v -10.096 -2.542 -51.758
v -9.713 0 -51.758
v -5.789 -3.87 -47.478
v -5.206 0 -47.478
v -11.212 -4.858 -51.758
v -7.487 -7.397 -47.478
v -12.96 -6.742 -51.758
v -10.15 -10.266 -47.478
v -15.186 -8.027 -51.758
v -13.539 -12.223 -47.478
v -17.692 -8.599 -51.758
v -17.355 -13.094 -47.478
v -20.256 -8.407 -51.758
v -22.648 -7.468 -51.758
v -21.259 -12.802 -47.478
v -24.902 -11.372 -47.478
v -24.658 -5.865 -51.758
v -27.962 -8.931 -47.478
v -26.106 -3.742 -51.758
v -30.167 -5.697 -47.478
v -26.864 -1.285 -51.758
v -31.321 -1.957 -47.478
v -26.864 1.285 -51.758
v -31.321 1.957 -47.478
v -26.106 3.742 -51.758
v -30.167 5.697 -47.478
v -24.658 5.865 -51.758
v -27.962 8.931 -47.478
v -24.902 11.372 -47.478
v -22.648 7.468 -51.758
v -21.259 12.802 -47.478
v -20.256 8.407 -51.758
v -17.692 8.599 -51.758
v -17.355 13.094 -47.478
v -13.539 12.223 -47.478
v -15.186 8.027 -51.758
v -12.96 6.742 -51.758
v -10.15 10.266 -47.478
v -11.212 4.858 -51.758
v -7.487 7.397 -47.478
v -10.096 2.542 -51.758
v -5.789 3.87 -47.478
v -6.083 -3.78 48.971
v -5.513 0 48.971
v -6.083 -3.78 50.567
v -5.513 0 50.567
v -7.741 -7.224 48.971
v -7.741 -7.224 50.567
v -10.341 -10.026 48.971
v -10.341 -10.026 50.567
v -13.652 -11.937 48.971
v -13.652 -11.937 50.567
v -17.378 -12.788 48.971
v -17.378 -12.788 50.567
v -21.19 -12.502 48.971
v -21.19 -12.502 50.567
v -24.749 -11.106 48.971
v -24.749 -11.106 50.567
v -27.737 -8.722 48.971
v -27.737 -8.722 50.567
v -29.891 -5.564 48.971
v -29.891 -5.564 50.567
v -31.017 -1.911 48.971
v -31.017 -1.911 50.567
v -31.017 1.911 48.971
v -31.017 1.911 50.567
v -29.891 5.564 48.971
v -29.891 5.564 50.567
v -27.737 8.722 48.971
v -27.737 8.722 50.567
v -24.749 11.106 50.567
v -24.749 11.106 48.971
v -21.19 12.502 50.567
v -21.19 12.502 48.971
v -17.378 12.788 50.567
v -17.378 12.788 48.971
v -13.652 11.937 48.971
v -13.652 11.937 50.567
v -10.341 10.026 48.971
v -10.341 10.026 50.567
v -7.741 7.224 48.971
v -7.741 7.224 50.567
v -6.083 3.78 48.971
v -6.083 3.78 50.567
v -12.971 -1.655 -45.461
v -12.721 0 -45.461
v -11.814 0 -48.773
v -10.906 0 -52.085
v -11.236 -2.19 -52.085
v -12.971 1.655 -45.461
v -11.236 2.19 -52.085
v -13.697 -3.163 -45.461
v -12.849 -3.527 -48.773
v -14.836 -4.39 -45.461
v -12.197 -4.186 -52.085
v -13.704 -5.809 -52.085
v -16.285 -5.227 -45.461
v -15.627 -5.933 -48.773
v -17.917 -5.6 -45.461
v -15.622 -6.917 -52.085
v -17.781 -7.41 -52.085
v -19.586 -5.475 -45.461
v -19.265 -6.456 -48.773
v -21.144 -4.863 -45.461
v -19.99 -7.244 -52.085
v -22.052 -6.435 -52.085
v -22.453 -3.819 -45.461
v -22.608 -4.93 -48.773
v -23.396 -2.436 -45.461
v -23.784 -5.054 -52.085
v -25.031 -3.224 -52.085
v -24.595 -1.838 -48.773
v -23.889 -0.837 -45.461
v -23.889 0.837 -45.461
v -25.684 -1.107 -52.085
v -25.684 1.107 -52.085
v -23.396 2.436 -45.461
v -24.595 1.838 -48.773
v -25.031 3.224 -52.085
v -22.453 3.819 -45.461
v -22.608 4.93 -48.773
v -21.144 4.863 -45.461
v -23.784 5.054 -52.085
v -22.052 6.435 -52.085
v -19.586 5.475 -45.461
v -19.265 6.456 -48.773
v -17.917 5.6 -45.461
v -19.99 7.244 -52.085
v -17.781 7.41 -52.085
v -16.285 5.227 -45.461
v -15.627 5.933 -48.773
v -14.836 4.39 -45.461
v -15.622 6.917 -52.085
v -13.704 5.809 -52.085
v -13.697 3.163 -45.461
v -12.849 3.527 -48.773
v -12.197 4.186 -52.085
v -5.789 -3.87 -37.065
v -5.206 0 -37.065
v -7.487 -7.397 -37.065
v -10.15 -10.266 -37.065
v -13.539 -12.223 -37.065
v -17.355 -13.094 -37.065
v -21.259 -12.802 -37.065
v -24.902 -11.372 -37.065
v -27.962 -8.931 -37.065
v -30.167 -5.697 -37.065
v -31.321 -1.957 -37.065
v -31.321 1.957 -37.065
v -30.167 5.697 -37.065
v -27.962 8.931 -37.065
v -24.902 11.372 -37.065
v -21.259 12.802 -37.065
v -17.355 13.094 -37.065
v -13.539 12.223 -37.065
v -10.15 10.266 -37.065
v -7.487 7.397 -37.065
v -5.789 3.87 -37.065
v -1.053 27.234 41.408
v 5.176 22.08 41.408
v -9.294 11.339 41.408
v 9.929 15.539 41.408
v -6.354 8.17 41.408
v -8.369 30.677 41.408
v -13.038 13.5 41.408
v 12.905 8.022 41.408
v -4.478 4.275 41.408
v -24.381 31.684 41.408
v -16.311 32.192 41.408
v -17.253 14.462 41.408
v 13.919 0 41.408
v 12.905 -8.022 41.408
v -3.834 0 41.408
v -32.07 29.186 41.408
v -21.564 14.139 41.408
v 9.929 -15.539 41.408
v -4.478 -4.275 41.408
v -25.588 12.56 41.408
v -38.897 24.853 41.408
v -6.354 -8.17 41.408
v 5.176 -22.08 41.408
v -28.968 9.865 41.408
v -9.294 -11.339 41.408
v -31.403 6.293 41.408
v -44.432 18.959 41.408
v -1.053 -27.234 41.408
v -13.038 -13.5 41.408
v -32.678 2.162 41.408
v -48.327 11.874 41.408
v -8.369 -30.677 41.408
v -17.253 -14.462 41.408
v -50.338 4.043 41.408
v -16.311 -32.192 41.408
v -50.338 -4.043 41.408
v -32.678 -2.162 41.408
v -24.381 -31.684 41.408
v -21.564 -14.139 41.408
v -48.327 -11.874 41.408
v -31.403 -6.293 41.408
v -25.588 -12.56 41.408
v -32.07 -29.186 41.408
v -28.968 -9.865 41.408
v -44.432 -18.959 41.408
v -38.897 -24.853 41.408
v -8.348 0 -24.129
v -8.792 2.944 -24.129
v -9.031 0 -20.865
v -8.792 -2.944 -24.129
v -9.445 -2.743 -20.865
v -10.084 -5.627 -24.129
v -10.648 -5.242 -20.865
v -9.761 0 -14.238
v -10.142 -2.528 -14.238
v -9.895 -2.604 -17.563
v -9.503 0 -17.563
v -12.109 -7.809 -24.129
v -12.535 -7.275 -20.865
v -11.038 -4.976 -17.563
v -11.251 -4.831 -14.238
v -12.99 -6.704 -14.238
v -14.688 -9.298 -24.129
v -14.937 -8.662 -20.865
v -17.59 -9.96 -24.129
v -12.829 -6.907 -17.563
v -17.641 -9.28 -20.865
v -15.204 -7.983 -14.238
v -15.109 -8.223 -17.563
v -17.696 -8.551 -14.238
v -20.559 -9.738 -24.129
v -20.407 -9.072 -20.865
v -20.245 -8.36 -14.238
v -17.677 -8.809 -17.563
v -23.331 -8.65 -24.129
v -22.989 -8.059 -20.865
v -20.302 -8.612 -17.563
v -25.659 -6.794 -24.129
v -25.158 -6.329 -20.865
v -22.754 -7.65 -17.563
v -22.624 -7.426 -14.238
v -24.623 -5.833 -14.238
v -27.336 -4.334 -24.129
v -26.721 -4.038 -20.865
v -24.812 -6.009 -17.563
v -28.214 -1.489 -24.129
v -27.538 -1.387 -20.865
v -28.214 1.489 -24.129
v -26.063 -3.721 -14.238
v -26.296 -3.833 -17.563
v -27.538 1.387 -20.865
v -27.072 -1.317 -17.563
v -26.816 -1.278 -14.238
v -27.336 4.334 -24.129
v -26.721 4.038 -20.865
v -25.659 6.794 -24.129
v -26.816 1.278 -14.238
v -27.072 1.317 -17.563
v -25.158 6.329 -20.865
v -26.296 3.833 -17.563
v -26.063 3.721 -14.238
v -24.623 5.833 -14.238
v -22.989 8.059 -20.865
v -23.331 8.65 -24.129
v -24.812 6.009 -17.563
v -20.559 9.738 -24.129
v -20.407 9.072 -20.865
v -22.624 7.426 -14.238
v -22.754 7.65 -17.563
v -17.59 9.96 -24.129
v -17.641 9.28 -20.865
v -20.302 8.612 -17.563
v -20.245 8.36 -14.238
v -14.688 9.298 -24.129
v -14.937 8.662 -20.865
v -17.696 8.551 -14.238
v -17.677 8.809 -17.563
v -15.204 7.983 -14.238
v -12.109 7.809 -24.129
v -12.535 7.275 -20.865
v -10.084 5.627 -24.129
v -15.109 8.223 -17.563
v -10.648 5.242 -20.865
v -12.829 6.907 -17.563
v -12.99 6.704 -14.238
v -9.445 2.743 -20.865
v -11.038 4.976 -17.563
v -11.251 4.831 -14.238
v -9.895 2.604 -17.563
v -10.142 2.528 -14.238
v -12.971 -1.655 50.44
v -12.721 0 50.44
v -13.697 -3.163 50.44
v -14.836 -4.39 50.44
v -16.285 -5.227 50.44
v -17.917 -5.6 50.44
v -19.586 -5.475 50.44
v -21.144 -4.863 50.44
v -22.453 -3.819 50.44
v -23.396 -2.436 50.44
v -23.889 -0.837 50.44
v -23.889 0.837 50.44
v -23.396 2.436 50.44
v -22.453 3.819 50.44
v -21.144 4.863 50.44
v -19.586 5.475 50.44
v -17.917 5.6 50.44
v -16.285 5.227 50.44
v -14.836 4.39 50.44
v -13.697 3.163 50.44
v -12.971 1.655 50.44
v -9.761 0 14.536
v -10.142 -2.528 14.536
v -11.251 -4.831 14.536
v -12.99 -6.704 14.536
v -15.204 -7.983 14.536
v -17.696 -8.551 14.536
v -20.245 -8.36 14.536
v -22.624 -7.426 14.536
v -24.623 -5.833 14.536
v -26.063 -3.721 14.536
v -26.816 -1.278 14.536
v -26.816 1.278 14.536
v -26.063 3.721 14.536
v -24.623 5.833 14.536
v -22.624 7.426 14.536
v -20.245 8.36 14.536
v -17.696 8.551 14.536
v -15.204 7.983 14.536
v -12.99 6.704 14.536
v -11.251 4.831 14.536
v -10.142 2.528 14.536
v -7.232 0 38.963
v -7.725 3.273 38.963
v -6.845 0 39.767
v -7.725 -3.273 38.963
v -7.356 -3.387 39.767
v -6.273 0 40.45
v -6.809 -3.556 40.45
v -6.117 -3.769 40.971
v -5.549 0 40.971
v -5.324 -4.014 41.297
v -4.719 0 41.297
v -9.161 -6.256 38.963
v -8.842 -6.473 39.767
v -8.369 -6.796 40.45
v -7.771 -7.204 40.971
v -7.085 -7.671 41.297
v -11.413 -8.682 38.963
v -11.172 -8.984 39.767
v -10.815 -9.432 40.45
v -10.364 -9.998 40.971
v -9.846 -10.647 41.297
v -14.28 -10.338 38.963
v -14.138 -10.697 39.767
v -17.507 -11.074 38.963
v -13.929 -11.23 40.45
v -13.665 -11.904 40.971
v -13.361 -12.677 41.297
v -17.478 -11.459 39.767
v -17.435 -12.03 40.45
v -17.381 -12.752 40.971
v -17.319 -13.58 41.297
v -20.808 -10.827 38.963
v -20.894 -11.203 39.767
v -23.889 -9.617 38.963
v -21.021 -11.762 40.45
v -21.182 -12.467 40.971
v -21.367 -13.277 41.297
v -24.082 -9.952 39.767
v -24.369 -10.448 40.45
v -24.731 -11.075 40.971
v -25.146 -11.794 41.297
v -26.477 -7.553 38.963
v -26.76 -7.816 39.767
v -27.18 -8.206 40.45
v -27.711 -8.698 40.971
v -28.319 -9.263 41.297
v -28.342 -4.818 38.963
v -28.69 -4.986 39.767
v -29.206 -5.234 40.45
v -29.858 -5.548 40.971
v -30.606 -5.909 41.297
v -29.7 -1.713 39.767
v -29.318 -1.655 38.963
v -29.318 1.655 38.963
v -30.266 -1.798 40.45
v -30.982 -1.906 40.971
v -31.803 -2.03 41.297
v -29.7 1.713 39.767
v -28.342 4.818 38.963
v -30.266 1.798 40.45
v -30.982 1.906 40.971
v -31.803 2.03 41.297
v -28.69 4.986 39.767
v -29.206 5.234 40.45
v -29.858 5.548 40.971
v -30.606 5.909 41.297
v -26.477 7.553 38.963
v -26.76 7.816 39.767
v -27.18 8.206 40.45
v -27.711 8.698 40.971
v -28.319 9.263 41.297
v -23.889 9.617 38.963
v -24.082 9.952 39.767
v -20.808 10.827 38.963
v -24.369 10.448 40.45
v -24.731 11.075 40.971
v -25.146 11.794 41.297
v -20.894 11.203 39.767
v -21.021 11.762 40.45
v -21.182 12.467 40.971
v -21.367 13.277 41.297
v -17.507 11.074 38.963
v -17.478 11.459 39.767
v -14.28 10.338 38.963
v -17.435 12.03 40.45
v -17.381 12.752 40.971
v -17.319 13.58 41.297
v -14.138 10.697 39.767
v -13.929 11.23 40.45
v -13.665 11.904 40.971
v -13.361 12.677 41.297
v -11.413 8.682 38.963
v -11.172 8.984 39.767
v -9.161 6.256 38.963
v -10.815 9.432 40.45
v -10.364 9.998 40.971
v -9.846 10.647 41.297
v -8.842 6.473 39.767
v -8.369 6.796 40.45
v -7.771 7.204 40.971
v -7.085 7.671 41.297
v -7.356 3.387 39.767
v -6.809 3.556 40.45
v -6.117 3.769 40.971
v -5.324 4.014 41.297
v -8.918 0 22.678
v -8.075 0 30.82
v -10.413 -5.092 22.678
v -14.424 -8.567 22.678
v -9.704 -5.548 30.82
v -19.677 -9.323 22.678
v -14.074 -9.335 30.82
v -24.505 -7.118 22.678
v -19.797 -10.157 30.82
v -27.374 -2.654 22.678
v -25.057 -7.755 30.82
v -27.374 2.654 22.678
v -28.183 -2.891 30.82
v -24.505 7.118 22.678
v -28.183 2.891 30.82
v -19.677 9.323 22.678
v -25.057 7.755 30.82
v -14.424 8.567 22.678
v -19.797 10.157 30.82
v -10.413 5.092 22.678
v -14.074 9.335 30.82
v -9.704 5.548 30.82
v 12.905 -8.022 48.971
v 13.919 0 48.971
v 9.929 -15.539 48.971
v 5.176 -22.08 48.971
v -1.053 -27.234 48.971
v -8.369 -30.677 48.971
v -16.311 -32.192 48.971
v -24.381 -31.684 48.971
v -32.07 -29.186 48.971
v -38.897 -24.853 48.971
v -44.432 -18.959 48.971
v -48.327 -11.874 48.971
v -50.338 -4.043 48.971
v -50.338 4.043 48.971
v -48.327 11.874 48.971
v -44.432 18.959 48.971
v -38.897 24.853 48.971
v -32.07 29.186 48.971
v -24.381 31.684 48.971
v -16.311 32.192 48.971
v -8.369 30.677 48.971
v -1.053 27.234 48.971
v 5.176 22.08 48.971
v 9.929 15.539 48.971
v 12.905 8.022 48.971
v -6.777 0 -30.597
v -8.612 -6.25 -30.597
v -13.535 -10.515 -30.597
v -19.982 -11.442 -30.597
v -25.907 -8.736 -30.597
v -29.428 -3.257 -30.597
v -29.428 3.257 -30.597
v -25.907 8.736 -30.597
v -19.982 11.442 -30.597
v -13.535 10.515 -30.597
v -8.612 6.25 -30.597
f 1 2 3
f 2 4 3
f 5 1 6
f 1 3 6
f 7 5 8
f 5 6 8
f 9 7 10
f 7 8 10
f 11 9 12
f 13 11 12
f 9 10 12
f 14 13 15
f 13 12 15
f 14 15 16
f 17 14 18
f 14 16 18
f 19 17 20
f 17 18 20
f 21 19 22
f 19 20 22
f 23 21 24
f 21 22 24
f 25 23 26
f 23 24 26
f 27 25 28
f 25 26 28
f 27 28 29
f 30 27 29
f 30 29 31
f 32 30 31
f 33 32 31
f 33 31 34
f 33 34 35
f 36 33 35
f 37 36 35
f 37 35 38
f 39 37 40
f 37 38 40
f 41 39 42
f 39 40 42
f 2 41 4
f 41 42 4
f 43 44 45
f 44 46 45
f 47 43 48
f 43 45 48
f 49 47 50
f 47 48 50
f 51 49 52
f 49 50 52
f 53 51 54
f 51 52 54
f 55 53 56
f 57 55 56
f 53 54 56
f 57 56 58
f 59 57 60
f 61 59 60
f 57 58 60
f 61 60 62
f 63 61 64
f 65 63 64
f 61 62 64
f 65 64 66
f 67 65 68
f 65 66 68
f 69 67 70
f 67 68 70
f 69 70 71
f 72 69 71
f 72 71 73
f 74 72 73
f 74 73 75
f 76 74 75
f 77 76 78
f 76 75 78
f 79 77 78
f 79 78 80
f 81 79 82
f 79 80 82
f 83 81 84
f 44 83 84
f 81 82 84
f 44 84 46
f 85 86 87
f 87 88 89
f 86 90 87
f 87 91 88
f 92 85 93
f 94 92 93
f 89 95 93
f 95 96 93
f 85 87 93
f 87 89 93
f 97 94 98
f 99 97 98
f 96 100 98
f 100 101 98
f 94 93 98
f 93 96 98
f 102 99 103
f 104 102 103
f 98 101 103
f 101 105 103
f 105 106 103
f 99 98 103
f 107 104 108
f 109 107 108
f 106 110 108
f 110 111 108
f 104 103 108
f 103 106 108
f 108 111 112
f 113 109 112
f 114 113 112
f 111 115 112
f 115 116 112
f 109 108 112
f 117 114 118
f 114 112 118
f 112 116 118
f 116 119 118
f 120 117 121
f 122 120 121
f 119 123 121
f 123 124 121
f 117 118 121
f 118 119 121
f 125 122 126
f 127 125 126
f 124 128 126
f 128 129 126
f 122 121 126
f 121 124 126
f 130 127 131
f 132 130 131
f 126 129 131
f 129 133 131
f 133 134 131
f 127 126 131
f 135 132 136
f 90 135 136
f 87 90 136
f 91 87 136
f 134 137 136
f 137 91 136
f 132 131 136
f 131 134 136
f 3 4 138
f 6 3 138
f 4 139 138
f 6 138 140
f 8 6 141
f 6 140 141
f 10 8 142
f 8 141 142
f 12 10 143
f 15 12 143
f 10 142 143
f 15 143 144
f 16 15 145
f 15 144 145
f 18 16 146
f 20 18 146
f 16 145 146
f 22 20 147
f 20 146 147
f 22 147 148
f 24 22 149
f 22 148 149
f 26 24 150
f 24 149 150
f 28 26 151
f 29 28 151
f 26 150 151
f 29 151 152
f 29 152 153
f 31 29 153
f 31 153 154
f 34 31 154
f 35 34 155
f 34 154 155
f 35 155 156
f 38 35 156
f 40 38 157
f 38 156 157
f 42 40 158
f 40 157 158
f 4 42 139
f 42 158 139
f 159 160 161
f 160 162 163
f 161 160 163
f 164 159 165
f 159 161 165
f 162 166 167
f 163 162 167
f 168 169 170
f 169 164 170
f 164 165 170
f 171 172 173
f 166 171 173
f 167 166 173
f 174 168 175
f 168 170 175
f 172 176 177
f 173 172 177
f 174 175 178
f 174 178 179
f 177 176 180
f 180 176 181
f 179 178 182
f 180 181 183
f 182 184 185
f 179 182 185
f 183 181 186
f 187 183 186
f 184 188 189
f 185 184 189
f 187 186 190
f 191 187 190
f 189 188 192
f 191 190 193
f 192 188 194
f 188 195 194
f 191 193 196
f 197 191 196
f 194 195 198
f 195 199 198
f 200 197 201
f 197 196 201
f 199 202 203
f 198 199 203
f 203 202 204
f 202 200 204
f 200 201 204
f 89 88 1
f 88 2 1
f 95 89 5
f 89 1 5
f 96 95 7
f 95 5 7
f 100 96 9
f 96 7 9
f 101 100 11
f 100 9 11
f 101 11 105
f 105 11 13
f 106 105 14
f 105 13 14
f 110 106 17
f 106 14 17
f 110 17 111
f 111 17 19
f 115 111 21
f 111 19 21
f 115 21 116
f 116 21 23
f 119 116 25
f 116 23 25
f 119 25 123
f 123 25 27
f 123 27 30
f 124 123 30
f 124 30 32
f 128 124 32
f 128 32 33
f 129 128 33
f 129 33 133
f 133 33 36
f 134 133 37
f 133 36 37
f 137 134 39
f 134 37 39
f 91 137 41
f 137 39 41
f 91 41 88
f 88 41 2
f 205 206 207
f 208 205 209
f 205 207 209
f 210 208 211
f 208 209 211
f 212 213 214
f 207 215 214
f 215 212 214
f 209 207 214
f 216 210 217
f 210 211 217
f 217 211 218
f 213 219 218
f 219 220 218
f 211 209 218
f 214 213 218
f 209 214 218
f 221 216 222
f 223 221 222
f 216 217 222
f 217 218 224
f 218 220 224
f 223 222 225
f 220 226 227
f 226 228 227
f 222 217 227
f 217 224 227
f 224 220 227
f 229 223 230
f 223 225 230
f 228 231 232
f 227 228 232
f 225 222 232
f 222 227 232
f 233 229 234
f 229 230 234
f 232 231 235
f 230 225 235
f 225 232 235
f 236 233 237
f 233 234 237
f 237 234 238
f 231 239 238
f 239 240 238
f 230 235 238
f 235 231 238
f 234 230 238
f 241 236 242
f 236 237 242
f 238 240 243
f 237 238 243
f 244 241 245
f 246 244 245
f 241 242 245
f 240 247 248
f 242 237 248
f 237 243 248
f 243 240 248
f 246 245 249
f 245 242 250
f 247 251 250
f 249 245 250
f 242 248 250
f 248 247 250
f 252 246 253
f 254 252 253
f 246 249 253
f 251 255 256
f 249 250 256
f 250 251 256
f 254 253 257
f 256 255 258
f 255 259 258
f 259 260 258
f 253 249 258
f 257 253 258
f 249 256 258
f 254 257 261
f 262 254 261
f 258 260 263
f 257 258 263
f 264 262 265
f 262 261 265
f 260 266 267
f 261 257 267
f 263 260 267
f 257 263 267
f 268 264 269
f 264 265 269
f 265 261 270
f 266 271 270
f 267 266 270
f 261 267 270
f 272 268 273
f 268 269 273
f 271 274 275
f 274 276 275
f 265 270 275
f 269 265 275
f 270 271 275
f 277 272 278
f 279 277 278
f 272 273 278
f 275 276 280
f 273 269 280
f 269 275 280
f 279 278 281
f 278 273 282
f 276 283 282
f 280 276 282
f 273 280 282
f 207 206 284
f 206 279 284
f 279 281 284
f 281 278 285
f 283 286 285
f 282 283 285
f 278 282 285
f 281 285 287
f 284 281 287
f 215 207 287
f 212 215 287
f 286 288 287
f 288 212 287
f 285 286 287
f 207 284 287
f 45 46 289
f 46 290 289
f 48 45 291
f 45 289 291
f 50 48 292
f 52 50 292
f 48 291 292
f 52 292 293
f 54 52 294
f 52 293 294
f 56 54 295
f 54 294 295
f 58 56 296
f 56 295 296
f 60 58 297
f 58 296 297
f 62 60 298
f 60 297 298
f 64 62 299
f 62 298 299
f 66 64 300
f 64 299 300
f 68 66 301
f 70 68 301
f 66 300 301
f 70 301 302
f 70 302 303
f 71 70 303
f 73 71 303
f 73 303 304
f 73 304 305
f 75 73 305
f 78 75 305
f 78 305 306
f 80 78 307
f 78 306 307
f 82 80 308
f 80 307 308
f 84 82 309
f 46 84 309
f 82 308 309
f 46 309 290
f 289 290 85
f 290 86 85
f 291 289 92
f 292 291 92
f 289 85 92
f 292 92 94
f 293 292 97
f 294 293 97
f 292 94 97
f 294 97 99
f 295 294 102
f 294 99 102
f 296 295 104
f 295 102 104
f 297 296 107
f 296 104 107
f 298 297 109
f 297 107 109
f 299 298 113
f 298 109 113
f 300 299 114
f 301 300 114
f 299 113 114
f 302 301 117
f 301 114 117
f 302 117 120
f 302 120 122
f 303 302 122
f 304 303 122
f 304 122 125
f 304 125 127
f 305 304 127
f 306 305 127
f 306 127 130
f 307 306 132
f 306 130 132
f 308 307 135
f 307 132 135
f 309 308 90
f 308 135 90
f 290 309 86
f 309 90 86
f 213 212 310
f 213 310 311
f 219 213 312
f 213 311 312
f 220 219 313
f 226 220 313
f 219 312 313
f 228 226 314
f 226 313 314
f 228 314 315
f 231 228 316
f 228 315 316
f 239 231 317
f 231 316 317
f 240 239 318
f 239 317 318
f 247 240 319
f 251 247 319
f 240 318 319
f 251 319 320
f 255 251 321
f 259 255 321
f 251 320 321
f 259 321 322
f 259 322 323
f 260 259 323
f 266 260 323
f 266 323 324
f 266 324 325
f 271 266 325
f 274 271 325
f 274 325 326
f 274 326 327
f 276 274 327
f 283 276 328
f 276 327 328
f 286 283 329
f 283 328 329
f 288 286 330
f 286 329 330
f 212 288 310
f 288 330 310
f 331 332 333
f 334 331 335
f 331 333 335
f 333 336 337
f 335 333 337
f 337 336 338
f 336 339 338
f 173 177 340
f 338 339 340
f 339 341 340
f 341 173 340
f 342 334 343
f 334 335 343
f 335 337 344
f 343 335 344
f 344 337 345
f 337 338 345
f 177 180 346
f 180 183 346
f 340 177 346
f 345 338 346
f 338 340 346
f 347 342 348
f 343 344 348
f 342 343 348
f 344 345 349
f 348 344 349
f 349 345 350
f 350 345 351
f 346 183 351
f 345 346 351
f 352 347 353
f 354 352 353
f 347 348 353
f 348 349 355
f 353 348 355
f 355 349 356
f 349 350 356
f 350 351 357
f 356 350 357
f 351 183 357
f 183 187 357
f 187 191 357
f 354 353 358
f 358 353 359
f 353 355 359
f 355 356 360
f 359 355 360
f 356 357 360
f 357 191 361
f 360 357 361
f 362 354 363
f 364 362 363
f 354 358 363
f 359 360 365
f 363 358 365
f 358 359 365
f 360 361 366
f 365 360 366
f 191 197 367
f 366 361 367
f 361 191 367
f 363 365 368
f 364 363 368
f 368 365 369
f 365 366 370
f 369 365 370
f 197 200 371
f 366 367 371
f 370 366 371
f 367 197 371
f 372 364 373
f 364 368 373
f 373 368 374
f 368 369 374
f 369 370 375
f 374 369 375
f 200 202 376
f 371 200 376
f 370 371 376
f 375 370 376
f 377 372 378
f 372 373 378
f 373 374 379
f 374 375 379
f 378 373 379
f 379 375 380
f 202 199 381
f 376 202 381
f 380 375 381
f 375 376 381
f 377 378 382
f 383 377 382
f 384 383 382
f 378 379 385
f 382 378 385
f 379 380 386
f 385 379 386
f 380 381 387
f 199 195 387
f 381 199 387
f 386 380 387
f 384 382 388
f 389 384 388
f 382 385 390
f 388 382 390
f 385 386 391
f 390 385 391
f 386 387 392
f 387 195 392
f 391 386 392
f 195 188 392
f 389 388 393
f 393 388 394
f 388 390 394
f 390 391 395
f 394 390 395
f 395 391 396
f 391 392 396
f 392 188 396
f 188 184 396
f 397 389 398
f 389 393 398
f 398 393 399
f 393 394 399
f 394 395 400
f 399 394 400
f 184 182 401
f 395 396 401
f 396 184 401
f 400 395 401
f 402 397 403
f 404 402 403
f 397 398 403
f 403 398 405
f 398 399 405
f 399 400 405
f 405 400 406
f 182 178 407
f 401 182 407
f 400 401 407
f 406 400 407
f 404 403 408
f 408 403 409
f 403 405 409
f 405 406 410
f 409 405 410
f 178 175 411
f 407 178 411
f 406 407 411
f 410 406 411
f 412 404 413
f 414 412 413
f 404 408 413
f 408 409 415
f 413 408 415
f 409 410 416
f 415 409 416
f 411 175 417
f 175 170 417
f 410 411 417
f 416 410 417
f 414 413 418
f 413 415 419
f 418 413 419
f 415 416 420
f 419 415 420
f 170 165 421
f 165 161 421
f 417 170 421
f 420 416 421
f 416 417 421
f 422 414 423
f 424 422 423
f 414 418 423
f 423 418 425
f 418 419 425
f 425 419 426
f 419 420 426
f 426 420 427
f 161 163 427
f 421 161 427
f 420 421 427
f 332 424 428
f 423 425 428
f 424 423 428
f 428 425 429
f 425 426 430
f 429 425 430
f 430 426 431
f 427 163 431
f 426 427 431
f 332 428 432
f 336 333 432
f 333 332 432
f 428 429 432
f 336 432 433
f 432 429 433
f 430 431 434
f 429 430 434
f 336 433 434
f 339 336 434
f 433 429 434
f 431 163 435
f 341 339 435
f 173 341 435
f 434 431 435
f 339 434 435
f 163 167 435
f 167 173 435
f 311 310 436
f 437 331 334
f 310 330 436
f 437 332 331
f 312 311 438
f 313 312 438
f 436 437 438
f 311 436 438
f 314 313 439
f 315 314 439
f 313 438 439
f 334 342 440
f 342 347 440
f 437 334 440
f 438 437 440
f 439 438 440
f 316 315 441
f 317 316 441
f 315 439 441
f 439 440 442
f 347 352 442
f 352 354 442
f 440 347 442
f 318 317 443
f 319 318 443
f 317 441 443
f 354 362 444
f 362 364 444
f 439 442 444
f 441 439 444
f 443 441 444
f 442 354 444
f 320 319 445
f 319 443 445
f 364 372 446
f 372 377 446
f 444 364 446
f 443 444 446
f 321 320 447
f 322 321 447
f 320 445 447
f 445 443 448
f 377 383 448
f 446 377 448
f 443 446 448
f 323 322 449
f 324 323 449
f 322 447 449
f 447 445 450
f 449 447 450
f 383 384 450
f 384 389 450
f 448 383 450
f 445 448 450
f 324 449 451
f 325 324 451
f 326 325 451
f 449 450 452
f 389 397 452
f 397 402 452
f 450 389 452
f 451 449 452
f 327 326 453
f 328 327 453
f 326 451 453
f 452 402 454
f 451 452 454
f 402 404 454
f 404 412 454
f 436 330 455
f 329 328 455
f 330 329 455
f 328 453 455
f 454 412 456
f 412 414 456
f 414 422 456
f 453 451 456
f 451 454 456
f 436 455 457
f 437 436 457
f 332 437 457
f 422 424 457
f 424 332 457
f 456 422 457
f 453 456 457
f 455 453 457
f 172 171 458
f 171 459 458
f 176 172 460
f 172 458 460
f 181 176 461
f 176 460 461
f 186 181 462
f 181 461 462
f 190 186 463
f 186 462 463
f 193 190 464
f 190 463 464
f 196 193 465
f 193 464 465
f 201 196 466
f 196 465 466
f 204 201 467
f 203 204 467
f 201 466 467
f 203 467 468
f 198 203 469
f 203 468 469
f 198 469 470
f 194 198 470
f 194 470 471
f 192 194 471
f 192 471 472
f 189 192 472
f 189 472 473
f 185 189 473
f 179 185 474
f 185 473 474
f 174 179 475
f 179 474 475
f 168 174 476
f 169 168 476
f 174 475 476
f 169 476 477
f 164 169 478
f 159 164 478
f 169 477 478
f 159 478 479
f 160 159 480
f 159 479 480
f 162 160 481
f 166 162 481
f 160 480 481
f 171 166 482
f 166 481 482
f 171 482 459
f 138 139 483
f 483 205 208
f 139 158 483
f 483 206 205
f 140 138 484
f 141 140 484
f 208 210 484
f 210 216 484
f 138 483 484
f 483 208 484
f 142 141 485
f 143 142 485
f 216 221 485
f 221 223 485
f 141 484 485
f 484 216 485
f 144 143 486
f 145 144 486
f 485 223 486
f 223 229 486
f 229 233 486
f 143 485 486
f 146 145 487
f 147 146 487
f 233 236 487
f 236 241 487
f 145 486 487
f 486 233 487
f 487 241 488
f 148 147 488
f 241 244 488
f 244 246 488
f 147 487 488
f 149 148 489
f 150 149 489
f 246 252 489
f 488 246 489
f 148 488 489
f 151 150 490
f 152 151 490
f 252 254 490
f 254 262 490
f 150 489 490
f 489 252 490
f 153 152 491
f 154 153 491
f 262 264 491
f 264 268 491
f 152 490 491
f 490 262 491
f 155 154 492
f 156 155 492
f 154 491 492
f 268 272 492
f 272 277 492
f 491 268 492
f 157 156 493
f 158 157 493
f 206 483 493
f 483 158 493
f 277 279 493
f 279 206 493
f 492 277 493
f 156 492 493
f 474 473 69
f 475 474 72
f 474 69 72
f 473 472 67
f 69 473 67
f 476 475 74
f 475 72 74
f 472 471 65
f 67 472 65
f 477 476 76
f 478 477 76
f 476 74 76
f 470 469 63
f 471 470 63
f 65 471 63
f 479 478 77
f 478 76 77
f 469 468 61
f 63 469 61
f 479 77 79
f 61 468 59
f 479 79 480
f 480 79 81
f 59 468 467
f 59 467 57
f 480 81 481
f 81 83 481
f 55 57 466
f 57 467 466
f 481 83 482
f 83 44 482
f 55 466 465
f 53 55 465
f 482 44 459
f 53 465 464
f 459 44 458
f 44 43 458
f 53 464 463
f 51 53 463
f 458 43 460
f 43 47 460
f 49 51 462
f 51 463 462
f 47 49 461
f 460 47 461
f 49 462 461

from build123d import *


with BuildPart() as f1:
    # F0 (on Front) → F1 (revolve)
    with BuildSketch(Plane.XZ):
        with BuildLine():
            Line((-5.512861, 50.567072), (-12.721327, 50.440166))
            Line((-12.721327, 50.440166), (-12.721327, -45.461077))
            Line((-12.721327, -45.461077), (-10.906334, -52.084621))
            Line((-10.906334, -52.084621), (-9.713333, -51.757713))
            Line((-9.713333, -51.757713), (-5.205728, -47.478069))
            Line((-5.205728, -47.478069), (-5.205728, -37.064623))
            Line((-5.205728, -37.064623), (-8.348268, -24.129307))
            ThreePointArc((-8.348268, -24.129307), (-9.293465, -19.217544), (-9.76137, -14.237597))
            Line((-9.76137, -14.237597), (-9.76137, 14.535546))
            Line((-9.76137, 14.535546), (-7.231527, 38.962592))
            ThreePointArc((-7.231527, 38.962592), (-5.927004, 40.733404), (-3.833717, 41.408464))
            Line((-3.833717, 41.408464), (13.918695, 41.408464))
            Line((13.918695, 41.408464), (13.918695, 48.971001))
            Line((13.918695, 48.971001), (-5.512861, 48.971001))
            Line((-5.512861, 48.971001), (-5.512861, 50.567072))
        make_face()
    revolve(axis=Axis((-18.336685, 0, -7.719919), (0, 0, -1)))


solid = f1.part
